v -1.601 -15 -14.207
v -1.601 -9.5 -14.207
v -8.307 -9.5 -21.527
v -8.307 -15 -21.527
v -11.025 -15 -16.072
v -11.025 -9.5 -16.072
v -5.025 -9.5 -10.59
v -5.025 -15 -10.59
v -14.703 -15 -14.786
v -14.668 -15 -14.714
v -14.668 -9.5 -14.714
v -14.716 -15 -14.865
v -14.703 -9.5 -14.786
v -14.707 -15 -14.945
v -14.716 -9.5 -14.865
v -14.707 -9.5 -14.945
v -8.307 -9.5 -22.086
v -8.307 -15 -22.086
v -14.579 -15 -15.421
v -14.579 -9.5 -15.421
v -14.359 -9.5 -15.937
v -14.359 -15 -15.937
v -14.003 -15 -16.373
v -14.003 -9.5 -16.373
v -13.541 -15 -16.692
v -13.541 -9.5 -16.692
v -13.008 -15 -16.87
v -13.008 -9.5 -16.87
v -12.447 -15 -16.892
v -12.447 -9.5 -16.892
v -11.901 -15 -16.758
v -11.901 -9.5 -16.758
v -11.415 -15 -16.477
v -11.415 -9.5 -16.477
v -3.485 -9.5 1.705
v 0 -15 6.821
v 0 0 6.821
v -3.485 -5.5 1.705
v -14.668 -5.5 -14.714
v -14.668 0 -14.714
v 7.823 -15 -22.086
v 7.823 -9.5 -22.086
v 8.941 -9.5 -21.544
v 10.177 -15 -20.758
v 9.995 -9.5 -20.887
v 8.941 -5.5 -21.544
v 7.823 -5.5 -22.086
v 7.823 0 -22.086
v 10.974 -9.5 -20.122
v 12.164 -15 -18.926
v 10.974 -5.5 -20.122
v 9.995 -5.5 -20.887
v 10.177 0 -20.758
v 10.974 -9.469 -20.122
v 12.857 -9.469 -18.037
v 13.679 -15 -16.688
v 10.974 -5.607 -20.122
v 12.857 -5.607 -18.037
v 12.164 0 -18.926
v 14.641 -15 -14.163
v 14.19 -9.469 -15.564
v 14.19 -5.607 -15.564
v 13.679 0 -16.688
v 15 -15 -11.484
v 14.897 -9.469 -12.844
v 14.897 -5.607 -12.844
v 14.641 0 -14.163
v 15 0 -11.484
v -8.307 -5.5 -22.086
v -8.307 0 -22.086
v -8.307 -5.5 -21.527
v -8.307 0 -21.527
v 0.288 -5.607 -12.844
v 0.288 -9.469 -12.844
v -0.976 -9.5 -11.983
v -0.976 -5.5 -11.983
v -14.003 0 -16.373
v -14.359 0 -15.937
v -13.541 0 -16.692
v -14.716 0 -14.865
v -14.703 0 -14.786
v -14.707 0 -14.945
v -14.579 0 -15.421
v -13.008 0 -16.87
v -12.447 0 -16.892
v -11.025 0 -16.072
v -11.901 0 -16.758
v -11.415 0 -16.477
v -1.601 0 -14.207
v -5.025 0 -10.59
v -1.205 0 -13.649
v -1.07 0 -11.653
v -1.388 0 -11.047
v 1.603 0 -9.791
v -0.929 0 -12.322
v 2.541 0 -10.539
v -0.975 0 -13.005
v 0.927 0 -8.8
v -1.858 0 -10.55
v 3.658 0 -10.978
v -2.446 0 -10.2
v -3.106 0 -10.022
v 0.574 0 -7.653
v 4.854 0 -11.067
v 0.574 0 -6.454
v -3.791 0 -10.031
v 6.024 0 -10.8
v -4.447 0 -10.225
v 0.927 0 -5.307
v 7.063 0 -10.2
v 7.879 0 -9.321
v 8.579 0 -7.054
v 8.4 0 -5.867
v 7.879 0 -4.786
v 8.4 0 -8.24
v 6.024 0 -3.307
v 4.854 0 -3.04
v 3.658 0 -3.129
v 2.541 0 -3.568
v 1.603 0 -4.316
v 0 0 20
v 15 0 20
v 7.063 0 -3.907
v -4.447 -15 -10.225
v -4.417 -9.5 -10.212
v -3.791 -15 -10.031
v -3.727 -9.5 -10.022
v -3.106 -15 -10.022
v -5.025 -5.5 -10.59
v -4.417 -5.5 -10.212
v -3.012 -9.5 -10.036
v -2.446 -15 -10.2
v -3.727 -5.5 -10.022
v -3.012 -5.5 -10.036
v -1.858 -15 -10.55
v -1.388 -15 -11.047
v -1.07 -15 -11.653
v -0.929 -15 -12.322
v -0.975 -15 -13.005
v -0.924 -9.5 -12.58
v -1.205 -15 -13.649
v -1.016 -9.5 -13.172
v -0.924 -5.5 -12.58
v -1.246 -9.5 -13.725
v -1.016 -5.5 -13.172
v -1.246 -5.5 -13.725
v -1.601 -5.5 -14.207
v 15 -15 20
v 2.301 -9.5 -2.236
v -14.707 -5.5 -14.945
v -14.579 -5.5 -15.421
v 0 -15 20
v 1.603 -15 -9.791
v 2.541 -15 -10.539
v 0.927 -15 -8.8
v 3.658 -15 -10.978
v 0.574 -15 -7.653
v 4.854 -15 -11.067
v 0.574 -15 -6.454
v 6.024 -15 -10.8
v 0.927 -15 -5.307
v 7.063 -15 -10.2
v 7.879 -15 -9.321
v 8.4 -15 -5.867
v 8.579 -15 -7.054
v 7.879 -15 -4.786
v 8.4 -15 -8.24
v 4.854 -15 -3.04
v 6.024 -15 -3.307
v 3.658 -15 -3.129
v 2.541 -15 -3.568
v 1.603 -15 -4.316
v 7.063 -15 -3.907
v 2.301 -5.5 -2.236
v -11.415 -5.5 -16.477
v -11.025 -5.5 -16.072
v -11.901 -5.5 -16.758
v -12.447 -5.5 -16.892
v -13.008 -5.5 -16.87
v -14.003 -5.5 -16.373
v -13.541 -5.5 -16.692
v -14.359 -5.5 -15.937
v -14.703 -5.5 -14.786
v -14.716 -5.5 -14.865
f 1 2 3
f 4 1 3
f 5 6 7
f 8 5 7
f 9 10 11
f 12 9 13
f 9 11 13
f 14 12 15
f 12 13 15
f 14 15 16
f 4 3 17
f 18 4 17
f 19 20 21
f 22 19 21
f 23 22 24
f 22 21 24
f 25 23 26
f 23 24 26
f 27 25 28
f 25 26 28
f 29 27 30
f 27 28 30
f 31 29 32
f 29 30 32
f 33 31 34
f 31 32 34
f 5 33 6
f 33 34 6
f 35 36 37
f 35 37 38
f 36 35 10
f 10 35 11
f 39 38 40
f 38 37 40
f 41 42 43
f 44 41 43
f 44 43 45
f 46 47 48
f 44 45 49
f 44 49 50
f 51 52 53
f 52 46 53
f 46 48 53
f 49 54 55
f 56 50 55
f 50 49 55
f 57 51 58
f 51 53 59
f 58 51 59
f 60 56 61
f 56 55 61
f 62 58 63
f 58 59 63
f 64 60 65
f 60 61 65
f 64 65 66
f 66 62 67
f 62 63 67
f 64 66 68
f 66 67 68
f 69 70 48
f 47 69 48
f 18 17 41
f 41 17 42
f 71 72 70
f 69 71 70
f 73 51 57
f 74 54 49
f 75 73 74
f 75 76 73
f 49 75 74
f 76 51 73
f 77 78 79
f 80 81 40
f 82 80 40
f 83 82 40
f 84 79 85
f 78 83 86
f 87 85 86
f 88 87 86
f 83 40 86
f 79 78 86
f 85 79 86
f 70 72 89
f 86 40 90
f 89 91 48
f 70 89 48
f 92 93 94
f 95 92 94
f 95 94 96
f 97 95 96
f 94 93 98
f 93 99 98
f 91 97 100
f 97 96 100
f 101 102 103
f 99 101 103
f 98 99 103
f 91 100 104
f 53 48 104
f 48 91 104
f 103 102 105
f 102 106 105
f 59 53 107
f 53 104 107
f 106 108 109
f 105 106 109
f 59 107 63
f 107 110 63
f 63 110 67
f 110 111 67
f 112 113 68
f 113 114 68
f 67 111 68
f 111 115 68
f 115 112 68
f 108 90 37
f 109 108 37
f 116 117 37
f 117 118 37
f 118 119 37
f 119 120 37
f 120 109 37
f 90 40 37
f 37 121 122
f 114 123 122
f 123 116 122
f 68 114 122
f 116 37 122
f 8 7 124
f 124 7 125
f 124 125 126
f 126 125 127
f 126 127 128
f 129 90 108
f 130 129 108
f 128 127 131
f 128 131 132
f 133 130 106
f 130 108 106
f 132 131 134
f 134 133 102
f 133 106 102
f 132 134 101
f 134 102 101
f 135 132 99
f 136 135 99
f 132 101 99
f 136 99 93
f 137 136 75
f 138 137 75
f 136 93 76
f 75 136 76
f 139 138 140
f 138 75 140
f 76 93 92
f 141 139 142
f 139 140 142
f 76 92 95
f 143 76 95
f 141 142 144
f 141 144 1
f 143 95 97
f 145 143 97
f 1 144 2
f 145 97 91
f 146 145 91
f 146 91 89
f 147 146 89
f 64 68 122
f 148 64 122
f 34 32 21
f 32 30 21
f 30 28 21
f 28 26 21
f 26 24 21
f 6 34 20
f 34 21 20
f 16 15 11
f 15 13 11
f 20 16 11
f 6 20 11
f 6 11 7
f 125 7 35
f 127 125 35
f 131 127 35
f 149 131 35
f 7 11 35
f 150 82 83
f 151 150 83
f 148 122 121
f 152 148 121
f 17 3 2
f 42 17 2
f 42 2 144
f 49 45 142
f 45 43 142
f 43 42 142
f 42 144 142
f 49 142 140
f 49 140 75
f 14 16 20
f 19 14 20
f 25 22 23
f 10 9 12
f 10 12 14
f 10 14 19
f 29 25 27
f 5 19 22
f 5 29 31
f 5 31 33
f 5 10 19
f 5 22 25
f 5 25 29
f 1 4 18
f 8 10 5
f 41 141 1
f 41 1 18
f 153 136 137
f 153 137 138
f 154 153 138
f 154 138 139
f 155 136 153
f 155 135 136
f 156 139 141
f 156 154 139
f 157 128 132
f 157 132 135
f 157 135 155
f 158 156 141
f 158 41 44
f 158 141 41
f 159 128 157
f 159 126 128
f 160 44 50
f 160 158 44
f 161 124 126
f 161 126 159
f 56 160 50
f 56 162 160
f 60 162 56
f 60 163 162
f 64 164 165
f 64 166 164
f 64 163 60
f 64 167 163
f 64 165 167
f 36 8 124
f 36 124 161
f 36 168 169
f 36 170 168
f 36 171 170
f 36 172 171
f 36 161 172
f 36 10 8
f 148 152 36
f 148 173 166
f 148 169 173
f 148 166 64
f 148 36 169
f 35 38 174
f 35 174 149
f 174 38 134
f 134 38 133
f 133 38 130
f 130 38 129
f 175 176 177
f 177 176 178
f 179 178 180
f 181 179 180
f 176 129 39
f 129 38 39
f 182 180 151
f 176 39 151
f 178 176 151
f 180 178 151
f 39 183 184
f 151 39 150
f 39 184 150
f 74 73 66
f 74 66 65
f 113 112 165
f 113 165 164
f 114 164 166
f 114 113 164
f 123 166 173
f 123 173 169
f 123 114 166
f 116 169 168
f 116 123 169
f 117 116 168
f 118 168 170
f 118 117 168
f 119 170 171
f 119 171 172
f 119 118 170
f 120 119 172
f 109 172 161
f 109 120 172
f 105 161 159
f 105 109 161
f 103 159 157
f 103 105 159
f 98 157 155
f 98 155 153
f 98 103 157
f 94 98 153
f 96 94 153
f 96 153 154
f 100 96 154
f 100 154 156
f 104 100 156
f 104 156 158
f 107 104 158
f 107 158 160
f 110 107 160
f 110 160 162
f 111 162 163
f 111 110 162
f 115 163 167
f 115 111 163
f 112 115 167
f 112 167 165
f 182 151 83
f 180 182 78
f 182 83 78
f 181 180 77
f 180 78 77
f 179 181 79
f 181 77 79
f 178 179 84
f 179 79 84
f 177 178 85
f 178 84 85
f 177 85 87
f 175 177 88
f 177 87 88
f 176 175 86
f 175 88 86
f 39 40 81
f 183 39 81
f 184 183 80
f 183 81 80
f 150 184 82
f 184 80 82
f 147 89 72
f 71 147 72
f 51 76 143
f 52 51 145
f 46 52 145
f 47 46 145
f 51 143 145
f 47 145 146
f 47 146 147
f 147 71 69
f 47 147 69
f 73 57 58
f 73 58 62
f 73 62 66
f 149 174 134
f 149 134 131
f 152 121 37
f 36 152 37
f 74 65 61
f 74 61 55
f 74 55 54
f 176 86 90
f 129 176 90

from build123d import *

# Parameters (mm, degrees)
F0_R     = 4.025
F1_DEPTH = 15
F2_W     = 4
F2_H     = 8.8454233903
F2_H_2   = 9.964544284
F3_DEPTH = 28.6711009125
F4_W     = 4
F4_H     = 9.9010998965
F5_DEPTH = 7
F7_DEPTH = 29.7172600886


# Not quite as in the source:
# - a feature names something its author has since deleted; it is built from what else it names


with BuildPart() as f1:
    # F0 (on Front) → F1 (new body)
    with BuildSketch(Plane.XZ):
        with BuildLine():
            Line((15, -11.0706584528), (15, 20))
            Line((15, 20), (0, 20))
            Line((0, 20), (0, 6.8212319165))
            Line((0, 6.8212319165), (-14.6675774532, -14.7143399477))
            ThreePointArc((-14.6675774532, -14.7143399477), (-14.7123164503, -14.8254204168), (-14.7066683885, -14.9450387593))
            Line((-14.7066683885, -14.9450387593), (-14.5789844453, -15.4207687435))
            ThreePointArc((-14.5789844453, -15.4207687435), (-13.0080916481, -16.8695228666), (-11.0253572607, -16.0724299998))
            Line((-11.0253572607, -16.0724299998), (-5.025187618, -10.5899751145))
            ThreePointArc((-5.025187618, -10.5899751145), (-1.6056896263, -10.7821354433), (-1.6008698149, -14.2070250586))
            Line((-1.6008698149, -14.2070250586), (-8.307190612, -21.5265534699))
            Line((-8.307190612, -21.5265534699), (-8.307190612, -22.085826844))
            Line((-8.307190612, -22.085826844), (7.8228749335, -22.085826844))
            ThreePointArc((7.8228749335, -22.085826844), (12.9859504737, -17.8510774103), (15, -11.4844412258))
            Line((15, -11.4844412258), (15, -11.0706584528))
        make_face()
        with Locations((4.5535718091, -7.0535713993)):
            Circle(F0_R, mode=Mode.SUBTRACT)
    extrude(amount=F1_DEPTH)

    # F2 (on face) → F3 (cut, through all)
    with BuildSketch(Plane(origin=(-3.1736560215, 0, 2.1615328257), x_dir=(0, -1, 0), z_dir=(-0.8265088883, 0, 0.5629236693))):
        with Locations((7.5, -24.8409709683)):
            Rectangle(F2_W, F2_H)
        with Locations((7.5, -15.4359871311)):
            Rectangle(F2_W, F2_H_2)
    extrude(amount=-F3_DEPTH, mode=Mode.SUBTRACT)

    # F4 (on face) → F5 (cut)
    with BuildSketch(Plane(origin=(-3.1736560215, 0, 2.1615328257), x_dir=(0, -1, 0), z_dir=(-0.8265088883, 0, 0.5629236693))):
        with Locations((7.5, -5.5031650409)):
            Rectangle(F4_W, F4_H)
    extrude(amount=-F5_DEPTH, mode=Mode.SUBTRACT)

    # F6 (on face) → F7 (cut, through all)
    with BuildSketch(Plane.YZ.offset(15)):
        Polygon((-9.4687892124, -16.3104510802), (-9.4687892124, -22.085826844), (-5.6066988036, -22.085826844), (-5.6066988036, -16.3104510802), (-5.6066988036, -12.8443576396), (-9.4687892124, -12.8443576396), align=None)
    extrude(amount=-F7_DEPTH, mode=Mode.SUBTRACT)


solid = f1.part
